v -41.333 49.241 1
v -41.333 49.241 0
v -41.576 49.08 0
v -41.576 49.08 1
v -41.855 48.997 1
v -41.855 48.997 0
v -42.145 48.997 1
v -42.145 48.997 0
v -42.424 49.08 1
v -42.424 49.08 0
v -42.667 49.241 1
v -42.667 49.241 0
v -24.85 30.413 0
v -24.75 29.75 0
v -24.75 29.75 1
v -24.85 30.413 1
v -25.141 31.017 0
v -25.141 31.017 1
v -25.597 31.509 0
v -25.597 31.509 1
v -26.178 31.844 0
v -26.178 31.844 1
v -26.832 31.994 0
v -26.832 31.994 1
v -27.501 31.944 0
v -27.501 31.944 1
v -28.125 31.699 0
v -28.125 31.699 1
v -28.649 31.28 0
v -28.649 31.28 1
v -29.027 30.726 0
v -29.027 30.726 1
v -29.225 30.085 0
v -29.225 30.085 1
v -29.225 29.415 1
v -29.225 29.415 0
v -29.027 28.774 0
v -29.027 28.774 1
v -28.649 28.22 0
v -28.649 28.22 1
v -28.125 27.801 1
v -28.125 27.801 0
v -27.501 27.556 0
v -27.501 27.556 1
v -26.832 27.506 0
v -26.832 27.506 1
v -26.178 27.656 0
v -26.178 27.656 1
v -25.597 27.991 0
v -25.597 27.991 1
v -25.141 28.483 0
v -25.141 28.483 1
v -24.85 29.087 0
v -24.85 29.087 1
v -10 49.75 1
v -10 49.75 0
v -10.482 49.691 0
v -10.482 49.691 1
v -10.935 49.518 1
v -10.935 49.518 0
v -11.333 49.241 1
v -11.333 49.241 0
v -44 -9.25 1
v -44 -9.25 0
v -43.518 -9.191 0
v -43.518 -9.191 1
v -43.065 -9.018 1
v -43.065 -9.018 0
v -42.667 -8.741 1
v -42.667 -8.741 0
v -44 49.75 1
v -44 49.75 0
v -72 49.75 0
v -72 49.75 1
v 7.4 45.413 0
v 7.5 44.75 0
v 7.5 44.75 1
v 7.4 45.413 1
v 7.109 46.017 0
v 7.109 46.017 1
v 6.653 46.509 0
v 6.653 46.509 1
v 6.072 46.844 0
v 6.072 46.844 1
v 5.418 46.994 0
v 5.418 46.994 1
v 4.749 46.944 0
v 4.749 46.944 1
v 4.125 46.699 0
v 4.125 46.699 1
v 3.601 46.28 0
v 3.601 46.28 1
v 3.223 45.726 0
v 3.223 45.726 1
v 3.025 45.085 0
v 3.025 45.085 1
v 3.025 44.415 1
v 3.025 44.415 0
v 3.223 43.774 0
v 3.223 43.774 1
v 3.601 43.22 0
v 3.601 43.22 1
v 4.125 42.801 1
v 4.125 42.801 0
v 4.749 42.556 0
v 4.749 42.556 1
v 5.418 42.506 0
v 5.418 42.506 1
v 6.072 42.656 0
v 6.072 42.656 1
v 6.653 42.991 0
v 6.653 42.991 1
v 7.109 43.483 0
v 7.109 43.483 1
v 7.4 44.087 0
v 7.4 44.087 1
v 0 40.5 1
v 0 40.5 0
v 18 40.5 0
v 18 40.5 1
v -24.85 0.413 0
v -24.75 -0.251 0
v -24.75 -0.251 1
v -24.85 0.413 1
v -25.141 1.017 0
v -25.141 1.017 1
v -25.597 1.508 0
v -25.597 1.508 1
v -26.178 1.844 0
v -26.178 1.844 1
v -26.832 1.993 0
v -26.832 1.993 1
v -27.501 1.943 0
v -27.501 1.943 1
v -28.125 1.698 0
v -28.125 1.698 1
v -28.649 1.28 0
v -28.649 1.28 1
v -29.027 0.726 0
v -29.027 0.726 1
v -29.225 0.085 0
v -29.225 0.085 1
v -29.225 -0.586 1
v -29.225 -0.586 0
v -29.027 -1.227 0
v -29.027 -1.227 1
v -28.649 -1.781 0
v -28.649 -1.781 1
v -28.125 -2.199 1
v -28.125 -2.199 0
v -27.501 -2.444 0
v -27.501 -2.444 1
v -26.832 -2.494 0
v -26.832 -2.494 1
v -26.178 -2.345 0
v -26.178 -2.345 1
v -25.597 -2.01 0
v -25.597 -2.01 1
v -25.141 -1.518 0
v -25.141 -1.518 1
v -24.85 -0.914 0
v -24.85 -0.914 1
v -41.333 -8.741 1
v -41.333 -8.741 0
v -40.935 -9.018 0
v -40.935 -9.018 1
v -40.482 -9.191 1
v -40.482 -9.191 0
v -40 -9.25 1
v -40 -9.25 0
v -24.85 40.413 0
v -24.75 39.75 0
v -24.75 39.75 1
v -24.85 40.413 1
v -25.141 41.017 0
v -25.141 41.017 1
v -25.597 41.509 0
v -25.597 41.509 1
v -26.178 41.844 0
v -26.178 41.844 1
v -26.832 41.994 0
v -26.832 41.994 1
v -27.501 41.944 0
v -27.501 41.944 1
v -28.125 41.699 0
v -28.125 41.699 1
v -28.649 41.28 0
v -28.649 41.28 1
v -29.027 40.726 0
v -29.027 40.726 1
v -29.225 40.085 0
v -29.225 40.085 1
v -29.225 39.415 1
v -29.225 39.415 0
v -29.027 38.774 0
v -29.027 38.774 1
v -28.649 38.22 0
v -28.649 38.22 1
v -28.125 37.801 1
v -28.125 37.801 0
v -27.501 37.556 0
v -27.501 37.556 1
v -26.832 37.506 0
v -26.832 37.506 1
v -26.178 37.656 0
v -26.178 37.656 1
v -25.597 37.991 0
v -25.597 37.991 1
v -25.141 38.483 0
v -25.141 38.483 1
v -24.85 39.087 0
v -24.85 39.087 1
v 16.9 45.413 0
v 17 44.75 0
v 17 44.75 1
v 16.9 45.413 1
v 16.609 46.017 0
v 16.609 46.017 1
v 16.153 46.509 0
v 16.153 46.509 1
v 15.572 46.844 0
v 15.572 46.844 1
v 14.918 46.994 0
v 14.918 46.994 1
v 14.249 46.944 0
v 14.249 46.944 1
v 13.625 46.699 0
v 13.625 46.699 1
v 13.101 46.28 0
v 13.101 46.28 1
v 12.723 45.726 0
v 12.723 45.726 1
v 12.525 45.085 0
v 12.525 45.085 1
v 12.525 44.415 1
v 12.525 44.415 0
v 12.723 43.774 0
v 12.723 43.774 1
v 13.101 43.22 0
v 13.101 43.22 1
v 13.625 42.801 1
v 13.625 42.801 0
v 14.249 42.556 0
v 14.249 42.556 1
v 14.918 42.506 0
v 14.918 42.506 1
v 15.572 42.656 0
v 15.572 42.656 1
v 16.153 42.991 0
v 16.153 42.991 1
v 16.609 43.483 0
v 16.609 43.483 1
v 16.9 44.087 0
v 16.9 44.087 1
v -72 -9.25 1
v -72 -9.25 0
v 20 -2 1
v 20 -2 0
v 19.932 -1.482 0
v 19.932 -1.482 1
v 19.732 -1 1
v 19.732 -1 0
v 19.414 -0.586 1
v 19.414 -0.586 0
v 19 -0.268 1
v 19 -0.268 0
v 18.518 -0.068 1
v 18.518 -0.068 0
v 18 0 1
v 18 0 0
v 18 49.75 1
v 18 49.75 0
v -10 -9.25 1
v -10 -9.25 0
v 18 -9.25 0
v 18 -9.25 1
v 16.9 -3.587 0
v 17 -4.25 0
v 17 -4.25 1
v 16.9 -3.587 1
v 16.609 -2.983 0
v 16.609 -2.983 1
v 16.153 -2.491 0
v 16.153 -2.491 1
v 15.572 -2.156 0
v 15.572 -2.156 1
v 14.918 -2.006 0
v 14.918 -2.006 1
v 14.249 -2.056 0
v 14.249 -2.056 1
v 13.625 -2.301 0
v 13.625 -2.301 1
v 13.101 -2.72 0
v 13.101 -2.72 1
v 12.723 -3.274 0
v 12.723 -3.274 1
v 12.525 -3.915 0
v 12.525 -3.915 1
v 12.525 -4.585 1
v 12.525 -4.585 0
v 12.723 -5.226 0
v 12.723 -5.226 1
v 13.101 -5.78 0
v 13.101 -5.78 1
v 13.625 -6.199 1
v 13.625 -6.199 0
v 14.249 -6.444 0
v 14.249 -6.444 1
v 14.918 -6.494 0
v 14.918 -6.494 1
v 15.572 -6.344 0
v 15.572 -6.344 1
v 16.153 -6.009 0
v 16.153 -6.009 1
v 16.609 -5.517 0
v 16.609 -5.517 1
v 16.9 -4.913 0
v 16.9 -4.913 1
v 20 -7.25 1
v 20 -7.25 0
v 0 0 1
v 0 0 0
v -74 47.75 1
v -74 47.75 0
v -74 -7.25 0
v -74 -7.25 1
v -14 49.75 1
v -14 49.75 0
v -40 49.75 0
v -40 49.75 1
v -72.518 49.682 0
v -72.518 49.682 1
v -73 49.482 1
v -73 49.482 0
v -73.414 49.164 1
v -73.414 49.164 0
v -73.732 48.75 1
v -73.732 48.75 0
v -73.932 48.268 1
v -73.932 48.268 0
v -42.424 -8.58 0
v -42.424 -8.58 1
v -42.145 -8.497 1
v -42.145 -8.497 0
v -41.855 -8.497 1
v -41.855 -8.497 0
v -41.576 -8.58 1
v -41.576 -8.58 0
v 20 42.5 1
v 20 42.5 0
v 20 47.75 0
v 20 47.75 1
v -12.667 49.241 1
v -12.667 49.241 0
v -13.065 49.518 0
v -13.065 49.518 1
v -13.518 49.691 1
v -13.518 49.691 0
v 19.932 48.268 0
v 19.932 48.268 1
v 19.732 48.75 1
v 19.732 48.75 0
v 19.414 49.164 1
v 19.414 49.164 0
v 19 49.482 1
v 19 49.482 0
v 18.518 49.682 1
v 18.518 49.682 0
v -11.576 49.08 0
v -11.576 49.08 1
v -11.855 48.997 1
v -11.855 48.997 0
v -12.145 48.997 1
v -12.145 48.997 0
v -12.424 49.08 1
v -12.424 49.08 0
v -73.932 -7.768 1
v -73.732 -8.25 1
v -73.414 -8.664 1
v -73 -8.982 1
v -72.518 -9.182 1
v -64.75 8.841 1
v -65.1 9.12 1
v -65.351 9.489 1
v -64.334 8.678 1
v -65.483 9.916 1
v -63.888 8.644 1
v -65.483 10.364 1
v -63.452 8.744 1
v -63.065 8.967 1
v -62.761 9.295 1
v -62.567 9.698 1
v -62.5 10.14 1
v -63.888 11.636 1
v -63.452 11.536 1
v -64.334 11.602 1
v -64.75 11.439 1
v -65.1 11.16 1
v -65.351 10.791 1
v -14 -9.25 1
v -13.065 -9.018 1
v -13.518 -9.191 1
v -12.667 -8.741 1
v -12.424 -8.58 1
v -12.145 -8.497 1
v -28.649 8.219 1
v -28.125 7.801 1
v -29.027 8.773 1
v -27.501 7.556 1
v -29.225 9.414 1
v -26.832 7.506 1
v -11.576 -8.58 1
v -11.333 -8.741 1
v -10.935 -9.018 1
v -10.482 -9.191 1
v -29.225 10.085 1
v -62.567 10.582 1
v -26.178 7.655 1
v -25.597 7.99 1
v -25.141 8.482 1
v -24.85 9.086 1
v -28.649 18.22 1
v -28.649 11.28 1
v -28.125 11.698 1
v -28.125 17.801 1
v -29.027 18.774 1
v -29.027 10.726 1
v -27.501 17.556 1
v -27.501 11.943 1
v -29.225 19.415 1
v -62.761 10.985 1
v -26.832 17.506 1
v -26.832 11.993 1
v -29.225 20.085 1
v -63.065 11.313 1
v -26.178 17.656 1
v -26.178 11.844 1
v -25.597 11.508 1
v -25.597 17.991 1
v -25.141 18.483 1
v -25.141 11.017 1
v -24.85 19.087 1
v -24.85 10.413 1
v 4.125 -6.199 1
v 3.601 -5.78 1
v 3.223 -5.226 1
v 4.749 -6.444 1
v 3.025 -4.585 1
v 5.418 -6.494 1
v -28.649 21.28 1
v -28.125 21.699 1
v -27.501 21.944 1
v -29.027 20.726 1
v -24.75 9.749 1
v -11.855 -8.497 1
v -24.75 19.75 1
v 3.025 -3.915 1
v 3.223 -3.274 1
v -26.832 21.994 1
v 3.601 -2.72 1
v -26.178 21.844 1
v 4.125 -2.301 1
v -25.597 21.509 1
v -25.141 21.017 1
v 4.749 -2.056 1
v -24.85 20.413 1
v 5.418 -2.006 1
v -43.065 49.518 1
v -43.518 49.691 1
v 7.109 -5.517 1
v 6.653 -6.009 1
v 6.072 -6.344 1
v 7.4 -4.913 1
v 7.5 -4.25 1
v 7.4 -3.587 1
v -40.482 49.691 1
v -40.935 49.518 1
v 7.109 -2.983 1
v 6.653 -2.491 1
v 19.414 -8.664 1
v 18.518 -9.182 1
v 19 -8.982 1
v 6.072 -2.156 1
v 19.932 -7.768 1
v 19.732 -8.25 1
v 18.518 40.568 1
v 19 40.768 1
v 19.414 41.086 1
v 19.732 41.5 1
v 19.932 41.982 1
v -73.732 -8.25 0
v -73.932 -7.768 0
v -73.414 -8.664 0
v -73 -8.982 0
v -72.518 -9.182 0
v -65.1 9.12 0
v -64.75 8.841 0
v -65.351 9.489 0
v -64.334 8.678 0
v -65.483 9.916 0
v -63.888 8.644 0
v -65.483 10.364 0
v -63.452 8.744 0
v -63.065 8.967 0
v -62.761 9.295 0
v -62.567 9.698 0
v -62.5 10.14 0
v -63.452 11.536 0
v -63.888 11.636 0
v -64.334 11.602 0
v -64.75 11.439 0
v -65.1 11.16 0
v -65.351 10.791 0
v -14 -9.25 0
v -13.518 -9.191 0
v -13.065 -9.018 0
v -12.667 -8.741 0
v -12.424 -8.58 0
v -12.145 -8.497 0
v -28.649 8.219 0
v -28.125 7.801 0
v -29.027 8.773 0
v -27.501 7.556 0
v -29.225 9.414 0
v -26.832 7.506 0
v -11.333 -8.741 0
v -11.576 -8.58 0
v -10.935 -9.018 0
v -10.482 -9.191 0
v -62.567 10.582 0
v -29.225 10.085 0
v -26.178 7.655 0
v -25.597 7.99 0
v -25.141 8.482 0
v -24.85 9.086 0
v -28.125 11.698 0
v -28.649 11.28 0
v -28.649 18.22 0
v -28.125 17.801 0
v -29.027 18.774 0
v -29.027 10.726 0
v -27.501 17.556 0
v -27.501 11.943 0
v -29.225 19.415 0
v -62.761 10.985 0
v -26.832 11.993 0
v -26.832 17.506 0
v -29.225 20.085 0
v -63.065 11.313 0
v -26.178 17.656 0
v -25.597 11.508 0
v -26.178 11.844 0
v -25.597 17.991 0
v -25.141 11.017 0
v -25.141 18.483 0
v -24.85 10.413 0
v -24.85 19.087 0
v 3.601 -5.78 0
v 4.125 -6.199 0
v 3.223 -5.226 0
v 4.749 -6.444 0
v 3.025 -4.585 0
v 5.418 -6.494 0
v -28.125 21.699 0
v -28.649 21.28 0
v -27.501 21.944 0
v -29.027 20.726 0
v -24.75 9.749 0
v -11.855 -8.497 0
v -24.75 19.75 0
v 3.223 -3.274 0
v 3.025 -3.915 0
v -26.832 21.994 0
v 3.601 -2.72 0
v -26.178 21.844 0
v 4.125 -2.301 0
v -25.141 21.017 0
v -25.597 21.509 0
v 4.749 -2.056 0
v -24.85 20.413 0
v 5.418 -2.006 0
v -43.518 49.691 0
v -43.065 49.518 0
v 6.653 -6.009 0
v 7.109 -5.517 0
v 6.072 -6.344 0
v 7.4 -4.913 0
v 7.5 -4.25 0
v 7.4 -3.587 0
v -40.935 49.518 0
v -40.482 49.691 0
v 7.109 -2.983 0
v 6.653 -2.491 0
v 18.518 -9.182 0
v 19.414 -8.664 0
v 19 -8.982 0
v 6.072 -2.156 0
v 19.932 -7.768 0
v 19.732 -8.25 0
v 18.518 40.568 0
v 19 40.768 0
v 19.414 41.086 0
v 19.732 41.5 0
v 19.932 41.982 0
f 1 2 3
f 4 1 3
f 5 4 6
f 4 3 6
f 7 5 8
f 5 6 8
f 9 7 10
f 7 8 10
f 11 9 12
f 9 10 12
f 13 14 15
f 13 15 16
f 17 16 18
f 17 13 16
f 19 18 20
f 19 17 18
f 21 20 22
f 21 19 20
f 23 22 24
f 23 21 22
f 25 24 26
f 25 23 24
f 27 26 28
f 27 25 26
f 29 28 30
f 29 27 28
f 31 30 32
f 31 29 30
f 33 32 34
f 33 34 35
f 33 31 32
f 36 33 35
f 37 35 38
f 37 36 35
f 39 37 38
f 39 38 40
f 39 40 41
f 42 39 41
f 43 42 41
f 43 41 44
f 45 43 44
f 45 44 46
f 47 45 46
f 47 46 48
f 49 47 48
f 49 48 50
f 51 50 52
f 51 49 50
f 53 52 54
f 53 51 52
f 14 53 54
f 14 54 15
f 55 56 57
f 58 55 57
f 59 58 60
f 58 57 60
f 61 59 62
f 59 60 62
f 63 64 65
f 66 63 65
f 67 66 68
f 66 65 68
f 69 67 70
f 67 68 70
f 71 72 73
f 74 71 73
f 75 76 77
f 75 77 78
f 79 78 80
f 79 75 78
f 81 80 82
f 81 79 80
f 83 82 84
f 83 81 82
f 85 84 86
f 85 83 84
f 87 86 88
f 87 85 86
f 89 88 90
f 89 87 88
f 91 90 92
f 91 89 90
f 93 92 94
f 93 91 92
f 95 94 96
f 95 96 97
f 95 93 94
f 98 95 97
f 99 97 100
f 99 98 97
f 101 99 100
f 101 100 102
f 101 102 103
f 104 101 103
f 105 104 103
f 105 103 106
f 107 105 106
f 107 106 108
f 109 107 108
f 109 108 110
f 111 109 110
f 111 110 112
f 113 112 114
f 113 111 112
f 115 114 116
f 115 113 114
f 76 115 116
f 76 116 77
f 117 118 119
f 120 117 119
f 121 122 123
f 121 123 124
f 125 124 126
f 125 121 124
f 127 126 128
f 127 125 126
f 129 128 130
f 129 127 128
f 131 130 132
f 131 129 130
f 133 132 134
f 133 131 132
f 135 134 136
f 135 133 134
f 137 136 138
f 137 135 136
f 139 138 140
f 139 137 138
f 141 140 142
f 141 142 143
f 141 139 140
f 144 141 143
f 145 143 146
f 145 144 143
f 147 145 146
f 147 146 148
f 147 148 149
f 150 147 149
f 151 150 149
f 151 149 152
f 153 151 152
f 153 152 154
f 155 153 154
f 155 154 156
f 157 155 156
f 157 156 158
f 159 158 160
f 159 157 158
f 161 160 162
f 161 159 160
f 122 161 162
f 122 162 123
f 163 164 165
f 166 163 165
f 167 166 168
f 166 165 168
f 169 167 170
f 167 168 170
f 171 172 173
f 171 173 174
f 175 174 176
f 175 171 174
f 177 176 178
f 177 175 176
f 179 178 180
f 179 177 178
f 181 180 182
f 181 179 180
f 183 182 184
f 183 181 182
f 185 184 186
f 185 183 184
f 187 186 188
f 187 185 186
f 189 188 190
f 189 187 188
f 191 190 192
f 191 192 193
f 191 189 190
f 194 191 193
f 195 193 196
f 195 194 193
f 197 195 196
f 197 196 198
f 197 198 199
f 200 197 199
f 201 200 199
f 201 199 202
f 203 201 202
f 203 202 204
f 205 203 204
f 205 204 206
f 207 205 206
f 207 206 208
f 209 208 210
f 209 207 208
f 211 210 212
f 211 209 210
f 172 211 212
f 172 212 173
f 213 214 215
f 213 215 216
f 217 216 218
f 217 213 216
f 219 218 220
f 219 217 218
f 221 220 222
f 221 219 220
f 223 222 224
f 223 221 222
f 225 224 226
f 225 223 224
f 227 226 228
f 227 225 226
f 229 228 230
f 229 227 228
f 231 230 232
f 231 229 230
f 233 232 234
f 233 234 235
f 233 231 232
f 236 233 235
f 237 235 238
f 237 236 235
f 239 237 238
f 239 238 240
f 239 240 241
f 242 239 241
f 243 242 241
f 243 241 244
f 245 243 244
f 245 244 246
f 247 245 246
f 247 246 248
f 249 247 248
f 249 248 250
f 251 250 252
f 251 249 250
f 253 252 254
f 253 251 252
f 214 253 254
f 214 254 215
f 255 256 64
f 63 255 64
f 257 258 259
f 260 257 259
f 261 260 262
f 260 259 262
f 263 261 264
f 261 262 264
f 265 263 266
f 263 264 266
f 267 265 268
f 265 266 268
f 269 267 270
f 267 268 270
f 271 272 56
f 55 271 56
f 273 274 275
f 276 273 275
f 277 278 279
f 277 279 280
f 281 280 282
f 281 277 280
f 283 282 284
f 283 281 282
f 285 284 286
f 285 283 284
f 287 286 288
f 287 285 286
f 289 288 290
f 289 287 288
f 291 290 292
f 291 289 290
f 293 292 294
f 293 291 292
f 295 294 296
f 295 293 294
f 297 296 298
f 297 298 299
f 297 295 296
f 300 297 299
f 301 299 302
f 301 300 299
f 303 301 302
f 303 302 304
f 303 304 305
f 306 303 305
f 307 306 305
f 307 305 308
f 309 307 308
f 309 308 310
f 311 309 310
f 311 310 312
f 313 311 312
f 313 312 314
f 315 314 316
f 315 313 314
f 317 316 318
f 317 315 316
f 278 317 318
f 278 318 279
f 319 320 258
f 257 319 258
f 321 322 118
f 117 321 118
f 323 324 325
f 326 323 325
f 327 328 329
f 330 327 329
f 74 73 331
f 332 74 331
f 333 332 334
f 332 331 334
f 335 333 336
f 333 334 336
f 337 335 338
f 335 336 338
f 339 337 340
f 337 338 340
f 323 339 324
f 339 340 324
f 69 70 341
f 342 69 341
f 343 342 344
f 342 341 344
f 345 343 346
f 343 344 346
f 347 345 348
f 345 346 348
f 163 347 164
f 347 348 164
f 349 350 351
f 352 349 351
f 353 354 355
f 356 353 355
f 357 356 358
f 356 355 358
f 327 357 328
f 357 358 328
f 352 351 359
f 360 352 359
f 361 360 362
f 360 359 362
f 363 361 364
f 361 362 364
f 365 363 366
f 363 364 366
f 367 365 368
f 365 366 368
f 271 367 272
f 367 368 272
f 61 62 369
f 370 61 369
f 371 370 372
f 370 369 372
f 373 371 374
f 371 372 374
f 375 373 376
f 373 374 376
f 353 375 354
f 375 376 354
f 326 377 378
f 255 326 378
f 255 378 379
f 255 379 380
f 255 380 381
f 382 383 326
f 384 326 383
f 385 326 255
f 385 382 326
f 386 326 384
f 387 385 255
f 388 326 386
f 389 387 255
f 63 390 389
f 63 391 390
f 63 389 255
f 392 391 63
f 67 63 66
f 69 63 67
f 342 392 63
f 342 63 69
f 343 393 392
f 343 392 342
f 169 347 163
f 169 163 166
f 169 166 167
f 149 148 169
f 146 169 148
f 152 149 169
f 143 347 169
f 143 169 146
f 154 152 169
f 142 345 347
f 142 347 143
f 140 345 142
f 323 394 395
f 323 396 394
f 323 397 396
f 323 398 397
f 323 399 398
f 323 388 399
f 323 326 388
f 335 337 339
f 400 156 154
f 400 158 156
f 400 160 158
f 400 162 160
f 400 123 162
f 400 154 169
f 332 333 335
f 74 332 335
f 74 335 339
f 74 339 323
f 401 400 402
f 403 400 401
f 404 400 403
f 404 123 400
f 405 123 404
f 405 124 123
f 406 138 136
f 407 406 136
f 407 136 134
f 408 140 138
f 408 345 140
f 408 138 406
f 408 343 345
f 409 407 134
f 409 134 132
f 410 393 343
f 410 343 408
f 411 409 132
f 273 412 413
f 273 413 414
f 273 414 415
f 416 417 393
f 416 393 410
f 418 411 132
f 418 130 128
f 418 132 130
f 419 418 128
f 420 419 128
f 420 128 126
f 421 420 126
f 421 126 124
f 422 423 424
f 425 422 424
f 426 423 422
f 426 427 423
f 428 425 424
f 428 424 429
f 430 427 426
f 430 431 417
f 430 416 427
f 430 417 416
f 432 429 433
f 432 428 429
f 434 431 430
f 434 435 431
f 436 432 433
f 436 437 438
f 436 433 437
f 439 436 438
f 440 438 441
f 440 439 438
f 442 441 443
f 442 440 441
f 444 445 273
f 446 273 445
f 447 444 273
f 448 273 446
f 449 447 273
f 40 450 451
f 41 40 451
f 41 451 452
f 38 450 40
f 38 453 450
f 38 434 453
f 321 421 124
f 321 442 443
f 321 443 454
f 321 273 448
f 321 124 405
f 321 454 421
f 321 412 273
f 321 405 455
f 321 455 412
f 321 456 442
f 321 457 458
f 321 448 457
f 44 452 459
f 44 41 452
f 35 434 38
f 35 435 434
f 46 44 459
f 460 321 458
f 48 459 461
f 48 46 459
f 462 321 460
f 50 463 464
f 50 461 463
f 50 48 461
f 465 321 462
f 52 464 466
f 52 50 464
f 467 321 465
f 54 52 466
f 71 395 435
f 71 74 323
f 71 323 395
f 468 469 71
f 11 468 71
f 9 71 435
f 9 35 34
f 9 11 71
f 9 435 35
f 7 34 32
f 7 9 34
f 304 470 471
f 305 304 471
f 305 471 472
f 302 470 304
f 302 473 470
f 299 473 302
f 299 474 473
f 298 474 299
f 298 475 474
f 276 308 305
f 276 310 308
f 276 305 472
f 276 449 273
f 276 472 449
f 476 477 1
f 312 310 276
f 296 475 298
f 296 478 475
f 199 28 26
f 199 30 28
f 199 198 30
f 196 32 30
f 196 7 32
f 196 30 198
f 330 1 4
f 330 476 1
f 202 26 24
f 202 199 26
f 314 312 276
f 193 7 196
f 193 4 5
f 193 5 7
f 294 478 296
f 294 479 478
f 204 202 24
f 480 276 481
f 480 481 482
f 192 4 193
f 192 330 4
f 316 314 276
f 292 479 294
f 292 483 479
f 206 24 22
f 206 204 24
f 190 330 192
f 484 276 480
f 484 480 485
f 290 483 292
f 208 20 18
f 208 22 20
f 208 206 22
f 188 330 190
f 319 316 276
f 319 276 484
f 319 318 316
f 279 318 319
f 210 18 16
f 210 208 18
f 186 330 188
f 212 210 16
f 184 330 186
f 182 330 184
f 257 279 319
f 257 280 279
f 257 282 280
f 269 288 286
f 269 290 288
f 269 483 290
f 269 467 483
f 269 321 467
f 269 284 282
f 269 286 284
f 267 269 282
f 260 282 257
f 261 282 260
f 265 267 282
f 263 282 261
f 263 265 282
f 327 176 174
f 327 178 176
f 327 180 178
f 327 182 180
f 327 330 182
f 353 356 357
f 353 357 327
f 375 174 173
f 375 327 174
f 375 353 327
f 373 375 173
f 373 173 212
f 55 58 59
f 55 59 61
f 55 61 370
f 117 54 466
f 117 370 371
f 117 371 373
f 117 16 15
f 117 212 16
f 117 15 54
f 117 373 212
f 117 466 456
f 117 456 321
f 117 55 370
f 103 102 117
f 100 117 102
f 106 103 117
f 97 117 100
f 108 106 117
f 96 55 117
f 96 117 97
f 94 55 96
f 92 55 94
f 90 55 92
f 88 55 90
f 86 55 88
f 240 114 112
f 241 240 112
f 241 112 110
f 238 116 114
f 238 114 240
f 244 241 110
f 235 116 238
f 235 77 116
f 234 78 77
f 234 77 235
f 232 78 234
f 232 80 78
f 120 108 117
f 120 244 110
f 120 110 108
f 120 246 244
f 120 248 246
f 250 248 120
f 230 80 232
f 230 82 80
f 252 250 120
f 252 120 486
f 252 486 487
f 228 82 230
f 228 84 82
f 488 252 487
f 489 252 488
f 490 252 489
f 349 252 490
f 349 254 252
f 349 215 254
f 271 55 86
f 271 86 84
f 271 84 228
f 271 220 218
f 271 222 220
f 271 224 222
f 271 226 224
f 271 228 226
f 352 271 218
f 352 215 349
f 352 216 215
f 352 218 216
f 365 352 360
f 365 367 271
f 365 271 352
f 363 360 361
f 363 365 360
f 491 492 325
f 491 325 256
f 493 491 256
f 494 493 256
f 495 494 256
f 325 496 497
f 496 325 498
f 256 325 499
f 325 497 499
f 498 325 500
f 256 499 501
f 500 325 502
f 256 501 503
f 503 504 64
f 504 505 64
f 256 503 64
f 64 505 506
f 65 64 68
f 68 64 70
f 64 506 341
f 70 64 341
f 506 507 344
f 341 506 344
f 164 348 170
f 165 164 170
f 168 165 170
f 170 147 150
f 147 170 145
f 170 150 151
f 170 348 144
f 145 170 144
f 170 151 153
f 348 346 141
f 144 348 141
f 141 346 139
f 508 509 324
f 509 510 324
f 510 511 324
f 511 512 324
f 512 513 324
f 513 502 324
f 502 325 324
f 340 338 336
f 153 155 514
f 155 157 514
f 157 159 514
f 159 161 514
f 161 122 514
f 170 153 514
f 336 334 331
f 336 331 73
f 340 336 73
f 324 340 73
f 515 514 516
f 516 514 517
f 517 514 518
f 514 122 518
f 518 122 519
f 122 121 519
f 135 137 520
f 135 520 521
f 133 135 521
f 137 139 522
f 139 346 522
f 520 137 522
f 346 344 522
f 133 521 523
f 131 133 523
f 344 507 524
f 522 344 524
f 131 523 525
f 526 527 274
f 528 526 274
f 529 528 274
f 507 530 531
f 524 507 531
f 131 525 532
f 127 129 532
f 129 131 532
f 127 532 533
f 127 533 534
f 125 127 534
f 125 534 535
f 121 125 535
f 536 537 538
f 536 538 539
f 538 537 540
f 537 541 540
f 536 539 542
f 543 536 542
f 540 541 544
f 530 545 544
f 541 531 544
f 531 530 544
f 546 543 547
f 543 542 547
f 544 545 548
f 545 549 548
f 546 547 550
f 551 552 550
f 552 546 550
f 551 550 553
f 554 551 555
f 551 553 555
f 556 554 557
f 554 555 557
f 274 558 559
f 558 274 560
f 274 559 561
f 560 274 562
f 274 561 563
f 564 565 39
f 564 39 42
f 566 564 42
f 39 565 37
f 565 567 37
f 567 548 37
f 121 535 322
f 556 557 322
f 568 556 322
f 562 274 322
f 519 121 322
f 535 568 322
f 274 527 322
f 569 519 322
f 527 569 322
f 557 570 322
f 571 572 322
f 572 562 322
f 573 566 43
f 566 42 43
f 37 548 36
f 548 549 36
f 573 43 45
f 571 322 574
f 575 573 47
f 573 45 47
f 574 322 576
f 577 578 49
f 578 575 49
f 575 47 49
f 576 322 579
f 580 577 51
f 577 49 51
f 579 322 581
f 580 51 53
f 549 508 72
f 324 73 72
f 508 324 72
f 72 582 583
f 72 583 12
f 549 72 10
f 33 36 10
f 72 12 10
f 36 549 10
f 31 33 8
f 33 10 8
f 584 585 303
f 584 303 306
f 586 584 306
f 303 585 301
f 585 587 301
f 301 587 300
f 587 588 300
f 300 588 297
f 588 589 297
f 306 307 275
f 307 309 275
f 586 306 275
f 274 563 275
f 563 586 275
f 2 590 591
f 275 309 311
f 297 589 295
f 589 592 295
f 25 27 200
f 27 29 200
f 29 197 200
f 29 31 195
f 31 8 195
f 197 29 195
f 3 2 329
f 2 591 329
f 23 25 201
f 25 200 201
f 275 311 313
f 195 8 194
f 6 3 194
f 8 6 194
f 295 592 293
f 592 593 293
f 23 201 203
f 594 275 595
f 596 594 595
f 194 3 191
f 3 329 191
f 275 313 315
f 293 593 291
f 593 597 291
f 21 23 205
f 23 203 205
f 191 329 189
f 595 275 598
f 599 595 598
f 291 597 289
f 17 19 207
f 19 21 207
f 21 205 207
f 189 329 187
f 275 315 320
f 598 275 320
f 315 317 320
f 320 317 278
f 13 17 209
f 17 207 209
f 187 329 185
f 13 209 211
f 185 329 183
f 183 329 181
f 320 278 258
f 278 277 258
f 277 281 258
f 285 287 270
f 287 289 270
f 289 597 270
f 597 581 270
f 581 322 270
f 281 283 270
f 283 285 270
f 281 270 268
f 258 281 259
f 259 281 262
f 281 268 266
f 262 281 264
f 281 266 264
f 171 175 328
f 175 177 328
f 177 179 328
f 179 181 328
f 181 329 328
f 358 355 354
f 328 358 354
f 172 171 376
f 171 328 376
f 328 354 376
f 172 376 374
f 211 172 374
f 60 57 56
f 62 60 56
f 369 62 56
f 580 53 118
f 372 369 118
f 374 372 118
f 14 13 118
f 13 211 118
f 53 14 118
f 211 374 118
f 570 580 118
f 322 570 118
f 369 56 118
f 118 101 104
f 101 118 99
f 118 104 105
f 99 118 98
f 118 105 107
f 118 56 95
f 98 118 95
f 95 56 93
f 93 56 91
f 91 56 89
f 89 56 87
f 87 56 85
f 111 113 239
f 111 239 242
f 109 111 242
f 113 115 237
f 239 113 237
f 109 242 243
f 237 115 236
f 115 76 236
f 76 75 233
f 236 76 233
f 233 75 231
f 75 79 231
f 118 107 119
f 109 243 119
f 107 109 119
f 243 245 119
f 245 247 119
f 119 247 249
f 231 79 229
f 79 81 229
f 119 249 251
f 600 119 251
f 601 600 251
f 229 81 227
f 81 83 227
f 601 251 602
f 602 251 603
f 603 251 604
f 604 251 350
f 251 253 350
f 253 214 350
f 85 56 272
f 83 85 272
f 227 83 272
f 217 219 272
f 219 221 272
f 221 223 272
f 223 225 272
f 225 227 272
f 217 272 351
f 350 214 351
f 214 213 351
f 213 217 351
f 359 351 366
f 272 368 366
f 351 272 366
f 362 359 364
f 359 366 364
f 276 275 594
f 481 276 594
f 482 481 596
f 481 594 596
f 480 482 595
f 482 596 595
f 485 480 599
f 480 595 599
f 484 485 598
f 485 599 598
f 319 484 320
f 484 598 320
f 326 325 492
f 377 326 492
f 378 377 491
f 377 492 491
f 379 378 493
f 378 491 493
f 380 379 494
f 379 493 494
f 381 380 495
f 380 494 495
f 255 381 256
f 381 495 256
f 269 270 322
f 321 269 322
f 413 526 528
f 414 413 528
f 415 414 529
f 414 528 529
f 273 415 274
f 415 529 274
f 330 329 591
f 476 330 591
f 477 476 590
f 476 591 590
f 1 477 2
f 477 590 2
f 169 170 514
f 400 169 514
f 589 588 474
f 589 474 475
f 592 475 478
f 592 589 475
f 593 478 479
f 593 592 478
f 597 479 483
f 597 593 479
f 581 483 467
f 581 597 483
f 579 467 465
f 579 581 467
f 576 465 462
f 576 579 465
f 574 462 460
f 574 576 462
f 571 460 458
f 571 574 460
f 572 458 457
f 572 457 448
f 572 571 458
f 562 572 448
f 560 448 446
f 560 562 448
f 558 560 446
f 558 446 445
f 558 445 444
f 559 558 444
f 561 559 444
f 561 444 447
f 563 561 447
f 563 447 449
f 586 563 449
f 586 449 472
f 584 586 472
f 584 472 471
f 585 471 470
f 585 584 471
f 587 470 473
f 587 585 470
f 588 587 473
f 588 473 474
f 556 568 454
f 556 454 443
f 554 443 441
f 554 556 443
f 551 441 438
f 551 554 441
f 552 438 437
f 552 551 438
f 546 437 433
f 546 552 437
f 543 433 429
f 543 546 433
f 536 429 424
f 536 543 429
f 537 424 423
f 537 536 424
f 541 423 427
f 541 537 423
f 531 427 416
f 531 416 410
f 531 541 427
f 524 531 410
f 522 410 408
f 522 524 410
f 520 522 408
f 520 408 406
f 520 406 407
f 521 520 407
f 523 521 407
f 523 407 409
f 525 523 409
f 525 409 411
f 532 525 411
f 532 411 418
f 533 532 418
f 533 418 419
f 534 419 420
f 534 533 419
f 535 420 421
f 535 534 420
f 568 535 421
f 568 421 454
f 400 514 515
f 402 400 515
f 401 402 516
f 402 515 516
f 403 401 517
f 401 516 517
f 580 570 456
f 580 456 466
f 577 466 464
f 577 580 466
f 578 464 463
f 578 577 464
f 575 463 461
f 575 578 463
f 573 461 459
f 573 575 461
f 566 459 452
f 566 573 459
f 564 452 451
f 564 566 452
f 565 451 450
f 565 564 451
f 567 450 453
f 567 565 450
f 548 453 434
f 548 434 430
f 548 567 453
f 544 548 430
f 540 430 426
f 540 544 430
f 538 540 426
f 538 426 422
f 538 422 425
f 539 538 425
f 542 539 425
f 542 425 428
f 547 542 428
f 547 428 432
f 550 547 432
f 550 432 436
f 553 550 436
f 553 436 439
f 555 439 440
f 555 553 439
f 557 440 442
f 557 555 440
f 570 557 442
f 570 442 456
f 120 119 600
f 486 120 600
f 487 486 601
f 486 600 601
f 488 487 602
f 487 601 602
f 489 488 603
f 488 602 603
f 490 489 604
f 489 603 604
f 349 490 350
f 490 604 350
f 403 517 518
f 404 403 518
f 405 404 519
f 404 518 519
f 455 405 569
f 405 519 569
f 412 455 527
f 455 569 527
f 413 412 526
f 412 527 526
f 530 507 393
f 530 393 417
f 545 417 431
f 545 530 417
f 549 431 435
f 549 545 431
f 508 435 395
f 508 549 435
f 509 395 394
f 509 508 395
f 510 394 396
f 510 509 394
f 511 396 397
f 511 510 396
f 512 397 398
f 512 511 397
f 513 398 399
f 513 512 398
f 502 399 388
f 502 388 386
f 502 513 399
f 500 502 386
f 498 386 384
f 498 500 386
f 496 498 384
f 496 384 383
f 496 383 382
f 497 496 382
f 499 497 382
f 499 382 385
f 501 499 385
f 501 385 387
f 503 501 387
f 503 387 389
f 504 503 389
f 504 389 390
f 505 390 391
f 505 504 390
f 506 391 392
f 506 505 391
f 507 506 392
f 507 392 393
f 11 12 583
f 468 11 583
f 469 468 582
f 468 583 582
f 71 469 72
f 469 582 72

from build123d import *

# Parameters (mm, degrees)
SKETCH1_R           = 2.25
SKETCH1_R_2         = 1.5
BOSS_EXTRUDE1_DEPTH = 1


with BuildPart() as part:
    # Sketch1 → Boss-Extrude1 (new body)
    with BuildSketch(Plane.XY):
        with BuildLine():
            Line((20, 42.5), (20, 47.75))
            ThreePointArc((20, 47.75), (19.414213562, 49.164213562), (18, 49.75))
            Line((18, 49.75), (-10, 49.75))
            ThreePointArc((-10, 49.75), (-10.71364418, 49.618344718), (-11.333333333, 49.240711985))
            ThreePointArc((-11.333333333, 49.240711985), (-12, 48.986067977), (-12.666666667, 49.240711985))
            ThreePointArc((-12.666666667, 49.240711985), (-13.28635582, 49.618344718), (-14, 49.75))
            Line((-14, 49.75), (-40, 49.75))
            ThreePointArc((-40, 49.75), (-40.71364418, 49.618344718), (-41.333333333, 49.240711985))
            ThreePointArc((-41.333333333, 49.240711985), (-42, 48.986067977), (-42.666666667, 49.240711985))
            ThreePointArc((-42.666666667, 49.240711985), (-43.28635582, 49.618344718), (-44, 49.75))
            Line((-44, 49.75), (-72, 49.75))
            ThreePointArc((-72, 49.75), (-73.414213562, 49.164213562), (-74, 47.75))
            Line((-74, 47.75), (-74, -7.25))
            ThreePointArc((-74, -7.25), (-73.414213562, -8.664213562), (-72, -9.25))
            Line((-72, -9.25), (-44, -9.25))
            ThreePointArc((-44, -9.25), (-43.28635582, -9.118344718), (-42.666666667, -8.740711985))
            ThreePointArc((-42.666666667, -8.740711985), (-42, -8.486067977), (-41.333333333, -8.740711985))
            ThreePointArc((-41.333333333, -8.740711985), (-40.71364418, -9.118344718), (-40, -9.25))
            Line((-40, -9.25), (-14, -9.25))
            ThreePointArc((-14, -9.25), (-13.28635582, -9.118344718), (-12.666666667, -8.740711985))
            ThreePointArc((-12.666666667, -8.740711985), (-12, -8.486067977), (-11.333333333, -8.740711985))
            ThreePointArc((-11.333333333, -8.740711985), (-10.71364418, -9.118344718), (-10, -9.25))
            Line((-10, -9.25), (18, -9.25))
            ThreePointArc((18, -9.25), (19.414213562, -8.664213562), (20, -7.25))
            Line((20, -7.25), (20, -2))
            ThreePointArc((20, -2), (19.414213562, -0.585786438), (18, 0))
            Line((18, 0), (0, 0))
            Line((0, 0), (0, 40.5))
            Line((0, 40.5), (18, 40.5))
            ThreePointArc((18, 40.5), (19.414213562, 41.085786438), (20, 42.5))
        make_face()
        with Locations((5.25, 44.75)):
            Circle(SKETCH1_R, mode=Mode.SUBTRACT)
        with Locations((14.75, 44.75)):
            Circle(SKETCH1_R, mode=Mode.SUBTRACT)
        with Locations((14.75, -4.25)):
            Circle(SKETCH1_R, mode=Mode.SUBTRACT)
        with Locations((5.25, -4.25)):
            Circle(SKETCH1_R, mode=Mode.SUBTRACT)
        with Locations((-27, 39.75)):
            Circle(SKETCH1_R, mode=Mode.SUBTRACT)
        with Locations((-27, 29.75)):
            Circle(SKETCH1_R, mode=Mode.SUBTRACT)
        with Locations((-27, 19.75)):
            Circle(SKETCH1_R, mode=Mode.SUBTRACT)
        with Locations((-27, 9.749358603)):
            Circle(SKETCH1_R, mode=Mode.SUBTRACT)
        with Locations((-27, -0.250641397)):
            Circle(SKETCH1_R, mode=Mode.SUBTRACT)
        with Locations((-64, 10.14)):
            Circle(SKETCH1_R_2, mode=Mode.SUBTRACT)
    extrude(amount=BOSS_EXTRUDE1_DEPTH)


solid = part.part
